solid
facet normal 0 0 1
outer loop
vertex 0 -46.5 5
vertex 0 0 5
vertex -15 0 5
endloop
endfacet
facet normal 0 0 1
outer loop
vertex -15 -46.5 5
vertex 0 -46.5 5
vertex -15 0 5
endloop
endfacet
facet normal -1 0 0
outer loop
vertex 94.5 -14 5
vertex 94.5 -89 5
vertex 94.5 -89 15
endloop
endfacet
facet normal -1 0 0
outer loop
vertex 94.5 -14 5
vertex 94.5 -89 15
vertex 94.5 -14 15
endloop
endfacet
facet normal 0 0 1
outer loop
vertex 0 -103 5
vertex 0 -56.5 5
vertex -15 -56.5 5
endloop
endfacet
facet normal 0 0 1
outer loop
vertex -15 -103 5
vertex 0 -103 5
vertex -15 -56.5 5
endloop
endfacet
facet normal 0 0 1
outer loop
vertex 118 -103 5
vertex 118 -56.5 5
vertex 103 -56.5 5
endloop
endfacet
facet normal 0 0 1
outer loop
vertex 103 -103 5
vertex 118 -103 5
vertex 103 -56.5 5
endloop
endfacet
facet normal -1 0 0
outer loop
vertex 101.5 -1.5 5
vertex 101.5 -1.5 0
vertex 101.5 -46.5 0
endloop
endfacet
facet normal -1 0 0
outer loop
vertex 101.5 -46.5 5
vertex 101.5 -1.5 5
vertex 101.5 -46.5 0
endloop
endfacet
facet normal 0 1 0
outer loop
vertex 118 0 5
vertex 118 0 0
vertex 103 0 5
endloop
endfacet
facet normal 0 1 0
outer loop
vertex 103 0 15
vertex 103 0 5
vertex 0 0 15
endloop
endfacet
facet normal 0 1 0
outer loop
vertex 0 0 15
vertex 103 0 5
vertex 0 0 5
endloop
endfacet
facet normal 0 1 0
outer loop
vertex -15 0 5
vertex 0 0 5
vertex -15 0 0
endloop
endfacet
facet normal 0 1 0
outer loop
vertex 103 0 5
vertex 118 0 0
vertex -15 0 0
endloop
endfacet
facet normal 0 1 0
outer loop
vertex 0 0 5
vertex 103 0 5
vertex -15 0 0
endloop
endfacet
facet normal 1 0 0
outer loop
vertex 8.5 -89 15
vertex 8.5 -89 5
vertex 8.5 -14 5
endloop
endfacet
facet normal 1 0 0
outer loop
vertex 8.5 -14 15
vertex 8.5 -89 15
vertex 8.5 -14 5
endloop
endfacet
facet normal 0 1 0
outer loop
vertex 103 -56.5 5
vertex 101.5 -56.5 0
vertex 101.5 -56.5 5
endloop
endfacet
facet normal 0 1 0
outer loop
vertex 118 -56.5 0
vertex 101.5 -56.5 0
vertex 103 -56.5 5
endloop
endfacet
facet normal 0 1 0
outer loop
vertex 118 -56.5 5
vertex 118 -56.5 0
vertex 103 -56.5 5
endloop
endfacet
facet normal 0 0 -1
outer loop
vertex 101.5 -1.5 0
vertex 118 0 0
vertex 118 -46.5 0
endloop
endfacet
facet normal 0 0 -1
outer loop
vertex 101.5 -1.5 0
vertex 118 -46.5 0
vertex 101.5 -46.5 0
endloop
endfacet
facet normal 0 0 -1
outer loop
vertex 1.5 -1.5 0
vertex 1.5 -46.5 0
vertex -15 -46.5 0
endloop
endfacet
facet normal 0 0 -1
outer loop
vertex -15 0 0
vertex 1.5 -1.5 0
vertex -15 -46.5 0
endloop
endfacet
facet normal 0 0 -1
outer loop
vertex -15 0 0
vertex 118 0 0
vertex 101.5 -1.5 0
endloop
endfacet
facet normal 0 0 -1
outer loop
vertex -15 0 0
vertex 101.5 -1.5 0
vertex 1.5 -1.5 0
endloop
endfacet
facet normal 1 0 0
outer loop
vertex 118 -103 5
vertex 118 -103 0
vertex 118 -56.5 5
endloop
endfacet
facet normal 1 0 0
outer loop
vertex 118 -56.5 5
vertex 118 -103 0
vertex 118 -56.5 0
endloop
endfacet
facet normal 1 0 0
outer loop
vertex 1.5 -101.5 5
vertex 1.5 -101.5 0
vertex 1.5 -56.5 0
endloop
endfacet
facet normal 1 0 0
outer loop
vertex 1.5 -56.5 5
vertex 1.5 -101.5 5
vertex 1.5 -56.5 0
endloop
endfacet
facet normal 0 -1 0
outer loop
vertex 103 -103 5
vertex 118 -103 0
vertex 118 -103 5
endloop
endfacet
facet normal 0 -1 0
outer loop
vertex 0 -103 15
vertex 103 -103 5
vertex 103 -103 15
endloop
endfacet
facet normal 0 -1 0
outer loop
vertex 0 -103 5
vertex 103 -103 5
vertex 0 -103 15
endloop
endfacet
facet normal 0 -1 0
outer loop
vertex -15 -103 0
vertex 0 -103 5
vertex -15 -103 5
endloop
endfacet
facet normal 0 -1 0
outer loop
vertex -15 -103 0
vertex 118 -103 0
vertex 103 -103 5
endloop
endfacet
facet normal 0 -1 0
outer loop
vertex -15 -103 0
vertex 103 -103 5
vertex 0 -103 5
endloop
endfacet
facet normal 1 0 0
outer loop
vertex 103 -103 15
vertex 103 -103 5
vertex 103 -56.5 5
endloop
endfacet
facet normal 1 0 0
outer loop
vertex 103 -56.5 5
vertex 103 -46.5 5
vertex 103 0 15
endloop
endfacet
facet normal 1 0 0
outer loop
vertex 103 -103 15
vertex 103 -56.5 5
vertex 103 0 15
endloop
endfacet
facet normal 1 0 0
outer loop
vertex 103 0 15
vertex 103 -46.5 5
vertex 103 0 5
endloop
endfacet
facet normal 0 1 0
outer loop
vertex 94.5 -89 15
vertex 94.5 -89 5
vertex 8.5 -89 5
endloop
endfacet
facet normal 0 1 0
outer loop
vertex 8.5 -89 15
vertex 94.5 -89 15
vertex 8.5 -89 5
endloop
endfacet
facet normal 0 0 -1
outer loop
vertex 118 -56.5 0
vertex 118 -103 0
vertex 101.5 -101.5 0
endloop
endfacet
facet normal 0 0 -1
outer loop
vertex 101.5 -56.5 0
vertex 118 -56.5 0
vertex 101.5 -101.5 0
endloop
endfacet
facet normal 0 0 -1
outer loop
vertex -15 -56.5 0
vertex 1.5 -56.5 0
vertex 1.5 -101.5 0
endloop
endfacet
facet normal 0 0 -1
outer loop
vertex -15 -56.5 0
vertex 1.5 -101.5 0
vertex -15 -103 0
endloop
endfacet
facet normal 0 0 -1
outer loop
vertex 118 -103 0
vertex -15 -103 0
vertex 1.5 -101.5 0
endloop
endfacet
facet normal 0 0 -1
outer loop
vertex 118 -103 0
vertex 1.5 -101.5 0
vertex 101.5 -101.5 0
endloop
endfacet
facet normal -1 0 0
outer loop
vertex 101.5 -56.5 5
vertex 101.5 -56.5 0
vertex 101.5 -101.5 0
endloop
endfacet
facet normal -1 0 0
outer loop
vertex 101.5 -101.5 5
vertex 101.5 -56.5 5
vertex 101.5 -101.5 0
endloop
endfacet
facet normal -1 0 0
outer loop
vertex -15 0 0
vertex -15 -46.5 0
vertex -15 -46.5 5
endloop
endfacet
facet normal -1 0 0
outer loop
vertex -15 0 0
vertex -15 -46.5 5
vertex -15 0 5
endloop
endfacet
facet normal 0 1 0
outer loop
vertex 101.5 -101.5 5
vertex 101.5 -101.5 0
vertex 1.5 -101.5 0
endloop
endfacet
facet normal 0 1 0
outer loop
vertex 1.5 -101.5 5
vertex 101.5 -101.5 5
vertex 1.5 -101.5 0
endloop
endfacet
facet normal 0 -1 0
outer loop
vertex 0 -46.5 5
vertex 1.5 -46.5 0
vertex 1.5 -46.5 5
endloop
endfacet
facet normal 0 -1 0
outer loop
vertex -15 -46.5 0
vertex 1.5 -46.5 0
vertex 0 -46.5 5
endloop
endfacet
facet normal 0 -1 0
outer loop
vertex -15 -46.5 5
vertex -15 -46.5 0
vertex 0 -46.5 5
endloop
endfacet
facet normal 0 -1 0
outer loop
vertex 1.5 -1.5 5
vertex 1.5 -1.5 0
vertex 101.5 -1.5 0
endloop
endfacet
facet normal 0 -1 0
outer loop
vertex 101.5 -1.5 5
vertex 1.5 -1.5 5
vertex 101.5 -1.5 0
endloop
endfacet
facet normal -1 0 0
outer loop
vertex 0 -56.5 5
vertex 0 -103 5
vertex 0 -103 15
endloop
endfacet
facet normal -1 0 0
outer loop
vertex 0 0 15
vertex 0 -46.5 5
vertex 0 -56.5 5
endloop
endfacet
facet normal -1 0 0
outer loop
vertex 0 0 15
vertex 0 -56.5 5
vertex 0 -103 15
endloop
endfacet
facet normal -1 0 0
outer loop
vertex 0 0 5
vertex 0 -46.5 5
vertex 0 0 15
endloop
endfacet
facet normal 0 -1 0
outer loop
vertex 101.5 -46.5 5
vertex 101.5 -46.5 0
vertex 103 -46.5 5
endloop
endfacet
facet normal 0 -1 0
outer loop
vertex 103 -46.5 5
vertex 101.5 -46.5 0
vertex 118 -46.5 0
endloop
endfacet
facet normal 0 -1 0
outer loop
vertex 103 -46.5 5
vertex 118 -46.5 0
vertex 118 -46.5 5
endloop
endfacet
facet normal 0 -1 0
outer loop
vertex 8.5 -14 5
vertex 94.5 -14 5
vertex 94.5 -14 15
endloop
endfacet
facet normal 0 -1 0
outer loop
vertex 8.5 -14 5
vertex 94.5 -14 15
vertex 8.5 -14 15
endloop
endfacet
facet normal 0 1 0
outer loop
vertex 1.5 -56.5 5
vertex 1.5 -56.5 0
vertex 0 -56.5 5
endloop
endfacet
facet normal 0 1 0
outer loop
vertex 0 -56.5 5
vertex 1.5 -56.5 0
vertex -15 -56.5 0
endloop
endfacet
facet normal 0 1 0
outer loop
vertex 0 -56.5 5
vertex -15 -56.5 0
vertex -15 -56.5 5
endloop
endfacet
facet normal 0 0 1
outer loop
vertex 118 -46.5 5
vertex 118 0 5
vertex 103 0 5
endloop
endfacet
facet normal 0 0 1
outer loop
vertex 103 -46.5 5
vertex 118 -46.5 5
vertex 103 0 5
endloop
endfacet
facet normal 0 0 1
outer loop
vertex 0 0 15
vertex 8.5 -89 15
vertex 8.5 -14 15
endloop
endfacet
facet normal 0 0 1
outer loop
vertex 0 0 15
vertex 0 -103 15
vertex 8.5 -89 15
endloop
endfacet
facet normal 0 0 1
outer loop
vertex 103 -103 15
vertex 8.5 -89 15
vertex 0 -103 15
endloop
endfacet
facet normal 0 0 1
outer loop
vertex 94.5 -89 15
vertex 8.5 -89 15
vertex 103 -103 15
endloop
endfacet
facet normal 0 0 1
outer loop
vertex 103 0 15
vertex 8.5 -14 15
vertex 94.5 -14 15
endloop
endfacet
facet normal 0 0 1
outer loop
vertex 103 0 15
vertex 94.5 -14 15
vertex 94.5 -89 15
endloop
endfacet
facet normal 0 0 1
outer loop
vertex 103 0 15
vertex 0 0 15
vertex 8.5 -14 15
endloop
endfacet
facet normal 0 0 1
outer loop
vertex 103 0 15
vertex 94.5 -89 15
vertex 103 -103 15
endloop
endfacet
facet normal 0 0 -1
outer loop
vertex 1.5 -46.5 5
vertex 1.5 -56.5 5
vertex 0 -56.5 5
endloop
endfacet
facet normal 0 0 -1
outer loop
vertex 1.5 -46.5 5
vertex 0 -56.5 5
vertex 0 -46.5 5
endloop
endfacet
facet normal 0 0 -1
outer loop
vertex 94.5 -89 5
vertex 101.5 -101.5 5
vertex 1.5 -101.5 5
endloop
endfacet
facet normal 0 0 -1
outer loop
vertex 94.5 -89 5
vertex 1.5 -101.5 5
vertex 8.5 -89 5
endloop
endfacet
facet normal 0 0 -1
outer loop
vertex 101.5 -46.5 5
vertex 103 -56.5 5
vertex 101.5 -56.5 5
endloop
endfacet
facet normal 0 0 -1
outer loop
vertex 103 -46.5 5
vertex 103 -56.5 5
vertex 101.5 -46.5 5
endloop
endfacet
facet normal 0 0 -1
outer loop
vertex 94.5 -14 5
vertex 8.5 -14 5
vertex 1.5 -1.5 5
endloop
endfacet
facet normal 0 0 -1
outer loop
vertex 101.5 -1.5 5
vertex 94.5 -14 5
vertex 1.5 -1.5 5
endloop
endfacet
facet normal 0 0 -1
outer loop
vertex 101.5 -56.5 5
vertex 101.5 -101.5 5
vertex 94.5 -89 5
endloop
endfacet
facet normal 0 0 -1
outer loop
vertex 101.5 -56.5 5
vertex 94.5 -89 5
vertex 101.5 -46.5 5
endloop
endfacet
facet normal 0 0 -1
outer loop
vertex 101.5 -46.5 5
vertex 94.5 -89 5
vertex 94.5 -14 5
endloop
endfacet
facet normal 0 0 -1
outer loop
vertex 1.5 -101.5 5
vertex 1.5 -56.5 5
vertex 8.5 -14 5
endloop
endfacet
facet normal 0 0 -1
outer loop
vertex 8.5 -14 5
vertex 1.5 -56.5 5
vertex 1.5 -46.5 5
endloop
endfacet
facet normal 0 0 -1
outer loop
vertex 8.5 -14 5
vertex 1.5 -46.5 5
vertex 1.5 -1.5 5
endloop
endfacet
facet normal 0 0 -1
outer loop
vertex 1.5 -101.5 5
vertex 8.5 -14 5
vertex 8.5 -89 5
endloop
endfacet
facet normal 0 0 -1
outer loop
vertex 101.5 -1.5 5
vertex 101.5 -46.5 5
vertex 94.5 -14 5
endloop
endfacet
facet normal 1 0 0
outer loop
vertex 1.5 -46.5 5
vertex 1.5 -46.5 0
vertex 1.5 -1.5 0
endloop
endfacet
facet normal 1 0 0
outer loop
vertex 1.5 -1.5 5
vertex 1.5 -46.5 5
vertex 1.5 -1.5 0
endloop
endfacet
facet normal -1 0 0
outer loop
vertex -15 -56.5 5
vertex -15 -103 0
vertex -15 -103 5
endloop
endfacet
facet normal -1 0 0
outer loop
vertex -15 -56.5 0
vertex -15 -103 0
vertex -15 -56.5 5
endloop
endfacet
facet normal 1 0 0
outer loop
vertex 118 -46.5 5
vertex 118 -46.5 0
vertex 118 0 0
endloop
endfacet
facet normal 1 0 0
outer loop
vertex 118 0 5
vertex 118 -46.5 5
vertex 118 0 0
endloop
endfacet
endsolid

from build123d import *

# Parameters (mm, degrees)
SKETCH1_W           = 103
SKETCH1_H           = 103
BOSS_EXTRUDE1_DEPTH = 15
SKETCH3_W           = 15
SKETCH3_H           = 103
BOSS_EXTRUDE2_DEPTH = 5
CUT_EXTRUDE1_DEPTH  = 5
SKETCH5_W           = 86
SKETCH5_H           = 75
CUT_EXTRUDE2_DEPTH  = 157.949036314
CUT_EXTRUDE5_REACH  = 170.888
SKETCH9_W           = 10
SKETCH9_H           = 10


with BuildPart() as part:
    # Sketch1 → Boss-Extrude1 (new body)
    with BuildSketch(Plane.XY):
        with Locations((51.5, -51.5)):
            Rectangle(SKETCH1_W, SKETCH1_H)
    extrude(amount=BOSS_EXTRUDE1_DEPTH)

    # Sketch3 → Boss-Extrude2 (add)
    with BuildSketch(Plane(origin=(0, 0, 0), x_dir=(-1, 0, 0), z_dir=(0, 0, -1))):
        with Locations((7.5, -51.5)):
            Rectangle(SKETCH3_W, SKETCH3_H)
        with Locations((-110.5, -51.5)):
            Rectangle(SKETCH3_W, SKETCH3_H)
    extrude(amount=-BOSS_EXTRUDE2_DEPTH)

    # Sketch4 → Cut-Extrude1 (cut)
    with BuildSketch(Plane(origin=(0, 0, 0), x_dir=(-1, 0, 0), z_dir=(0, 0, -1))):
        Polygon((-51.5, -51.5), (-101.5, -1.5), (-101.5, -101.5), align=None)
        Polygon((-1.5, -1.5), (-101.5, -1.5), (-51.5, -51.5), align=None)
        Polygon((-1.5, -1.5), (-51.5, -51.5), (-1.5, -101.5), align=None)
        Polygon((-1.5, -101.5), (-51.5, -51.5), (-101.5, -101.5), align=None)
    extrude(amount=-CUT_EXTRUDE1_DEPTH, mode=Mode.SUBTRACT)

    # Sketch5 → Cut-Extrude2 (cut, through all)
    with BuildSketch(Plane(origin=(0, 0, 5), x_dir=(-1, 0, 0), z_dir=(0, 0, -1))):
        with Locations((-51.5, -51.5)):
            Rectangle(SKETCH5_W, SKETCH5_H)
    extrude(amount=-CUT_EXTRUDE2_DEPTH, mode=Mode.SUBTRACT)

    # Cut-Extrude5: up to this face of the body (flat: up to its plane)
    cut_extrude5_end = Plane(part.part.faces().sort_by_distance((8.5, -51.5, 10))[0])
    # Sketch9 → Cut-Extrude5 (cut, up to the picked face)
    with BuildSketch(Plane.ZY.offset(15), mode=Mode.PRIVATE) as cut_extrude5_sk1:
        with Locations((0, -51.5)):
            Rectangle(SKETCH9_W, SKETCH9_H)
    cut_extrude5_tool1 = split(extrude(cut_extrude5_sk1.sketch, amount=-CUT_EXTRUDE5_REACH, mode=Mode.PRIVATE), bisect_by=cut_extrude5_end, keep=Keep.BOTH, mode=Mode.PRIVATE)
    cut_extrude5 = cut_extrude5_tool1.solids().sort_by(Axis((-15, -51.5, 0), (1, 0, 0)))[0]
    add(cut_extrude5, mode=Mode.SUBTRACT)

    # Mirror1: Cut-Extrude5 across plane
    add(cut_extrude5.mirror(Plane.ZY.offset(-51.5)), mode=Mode.SUBTRACT)


solid = part.part
